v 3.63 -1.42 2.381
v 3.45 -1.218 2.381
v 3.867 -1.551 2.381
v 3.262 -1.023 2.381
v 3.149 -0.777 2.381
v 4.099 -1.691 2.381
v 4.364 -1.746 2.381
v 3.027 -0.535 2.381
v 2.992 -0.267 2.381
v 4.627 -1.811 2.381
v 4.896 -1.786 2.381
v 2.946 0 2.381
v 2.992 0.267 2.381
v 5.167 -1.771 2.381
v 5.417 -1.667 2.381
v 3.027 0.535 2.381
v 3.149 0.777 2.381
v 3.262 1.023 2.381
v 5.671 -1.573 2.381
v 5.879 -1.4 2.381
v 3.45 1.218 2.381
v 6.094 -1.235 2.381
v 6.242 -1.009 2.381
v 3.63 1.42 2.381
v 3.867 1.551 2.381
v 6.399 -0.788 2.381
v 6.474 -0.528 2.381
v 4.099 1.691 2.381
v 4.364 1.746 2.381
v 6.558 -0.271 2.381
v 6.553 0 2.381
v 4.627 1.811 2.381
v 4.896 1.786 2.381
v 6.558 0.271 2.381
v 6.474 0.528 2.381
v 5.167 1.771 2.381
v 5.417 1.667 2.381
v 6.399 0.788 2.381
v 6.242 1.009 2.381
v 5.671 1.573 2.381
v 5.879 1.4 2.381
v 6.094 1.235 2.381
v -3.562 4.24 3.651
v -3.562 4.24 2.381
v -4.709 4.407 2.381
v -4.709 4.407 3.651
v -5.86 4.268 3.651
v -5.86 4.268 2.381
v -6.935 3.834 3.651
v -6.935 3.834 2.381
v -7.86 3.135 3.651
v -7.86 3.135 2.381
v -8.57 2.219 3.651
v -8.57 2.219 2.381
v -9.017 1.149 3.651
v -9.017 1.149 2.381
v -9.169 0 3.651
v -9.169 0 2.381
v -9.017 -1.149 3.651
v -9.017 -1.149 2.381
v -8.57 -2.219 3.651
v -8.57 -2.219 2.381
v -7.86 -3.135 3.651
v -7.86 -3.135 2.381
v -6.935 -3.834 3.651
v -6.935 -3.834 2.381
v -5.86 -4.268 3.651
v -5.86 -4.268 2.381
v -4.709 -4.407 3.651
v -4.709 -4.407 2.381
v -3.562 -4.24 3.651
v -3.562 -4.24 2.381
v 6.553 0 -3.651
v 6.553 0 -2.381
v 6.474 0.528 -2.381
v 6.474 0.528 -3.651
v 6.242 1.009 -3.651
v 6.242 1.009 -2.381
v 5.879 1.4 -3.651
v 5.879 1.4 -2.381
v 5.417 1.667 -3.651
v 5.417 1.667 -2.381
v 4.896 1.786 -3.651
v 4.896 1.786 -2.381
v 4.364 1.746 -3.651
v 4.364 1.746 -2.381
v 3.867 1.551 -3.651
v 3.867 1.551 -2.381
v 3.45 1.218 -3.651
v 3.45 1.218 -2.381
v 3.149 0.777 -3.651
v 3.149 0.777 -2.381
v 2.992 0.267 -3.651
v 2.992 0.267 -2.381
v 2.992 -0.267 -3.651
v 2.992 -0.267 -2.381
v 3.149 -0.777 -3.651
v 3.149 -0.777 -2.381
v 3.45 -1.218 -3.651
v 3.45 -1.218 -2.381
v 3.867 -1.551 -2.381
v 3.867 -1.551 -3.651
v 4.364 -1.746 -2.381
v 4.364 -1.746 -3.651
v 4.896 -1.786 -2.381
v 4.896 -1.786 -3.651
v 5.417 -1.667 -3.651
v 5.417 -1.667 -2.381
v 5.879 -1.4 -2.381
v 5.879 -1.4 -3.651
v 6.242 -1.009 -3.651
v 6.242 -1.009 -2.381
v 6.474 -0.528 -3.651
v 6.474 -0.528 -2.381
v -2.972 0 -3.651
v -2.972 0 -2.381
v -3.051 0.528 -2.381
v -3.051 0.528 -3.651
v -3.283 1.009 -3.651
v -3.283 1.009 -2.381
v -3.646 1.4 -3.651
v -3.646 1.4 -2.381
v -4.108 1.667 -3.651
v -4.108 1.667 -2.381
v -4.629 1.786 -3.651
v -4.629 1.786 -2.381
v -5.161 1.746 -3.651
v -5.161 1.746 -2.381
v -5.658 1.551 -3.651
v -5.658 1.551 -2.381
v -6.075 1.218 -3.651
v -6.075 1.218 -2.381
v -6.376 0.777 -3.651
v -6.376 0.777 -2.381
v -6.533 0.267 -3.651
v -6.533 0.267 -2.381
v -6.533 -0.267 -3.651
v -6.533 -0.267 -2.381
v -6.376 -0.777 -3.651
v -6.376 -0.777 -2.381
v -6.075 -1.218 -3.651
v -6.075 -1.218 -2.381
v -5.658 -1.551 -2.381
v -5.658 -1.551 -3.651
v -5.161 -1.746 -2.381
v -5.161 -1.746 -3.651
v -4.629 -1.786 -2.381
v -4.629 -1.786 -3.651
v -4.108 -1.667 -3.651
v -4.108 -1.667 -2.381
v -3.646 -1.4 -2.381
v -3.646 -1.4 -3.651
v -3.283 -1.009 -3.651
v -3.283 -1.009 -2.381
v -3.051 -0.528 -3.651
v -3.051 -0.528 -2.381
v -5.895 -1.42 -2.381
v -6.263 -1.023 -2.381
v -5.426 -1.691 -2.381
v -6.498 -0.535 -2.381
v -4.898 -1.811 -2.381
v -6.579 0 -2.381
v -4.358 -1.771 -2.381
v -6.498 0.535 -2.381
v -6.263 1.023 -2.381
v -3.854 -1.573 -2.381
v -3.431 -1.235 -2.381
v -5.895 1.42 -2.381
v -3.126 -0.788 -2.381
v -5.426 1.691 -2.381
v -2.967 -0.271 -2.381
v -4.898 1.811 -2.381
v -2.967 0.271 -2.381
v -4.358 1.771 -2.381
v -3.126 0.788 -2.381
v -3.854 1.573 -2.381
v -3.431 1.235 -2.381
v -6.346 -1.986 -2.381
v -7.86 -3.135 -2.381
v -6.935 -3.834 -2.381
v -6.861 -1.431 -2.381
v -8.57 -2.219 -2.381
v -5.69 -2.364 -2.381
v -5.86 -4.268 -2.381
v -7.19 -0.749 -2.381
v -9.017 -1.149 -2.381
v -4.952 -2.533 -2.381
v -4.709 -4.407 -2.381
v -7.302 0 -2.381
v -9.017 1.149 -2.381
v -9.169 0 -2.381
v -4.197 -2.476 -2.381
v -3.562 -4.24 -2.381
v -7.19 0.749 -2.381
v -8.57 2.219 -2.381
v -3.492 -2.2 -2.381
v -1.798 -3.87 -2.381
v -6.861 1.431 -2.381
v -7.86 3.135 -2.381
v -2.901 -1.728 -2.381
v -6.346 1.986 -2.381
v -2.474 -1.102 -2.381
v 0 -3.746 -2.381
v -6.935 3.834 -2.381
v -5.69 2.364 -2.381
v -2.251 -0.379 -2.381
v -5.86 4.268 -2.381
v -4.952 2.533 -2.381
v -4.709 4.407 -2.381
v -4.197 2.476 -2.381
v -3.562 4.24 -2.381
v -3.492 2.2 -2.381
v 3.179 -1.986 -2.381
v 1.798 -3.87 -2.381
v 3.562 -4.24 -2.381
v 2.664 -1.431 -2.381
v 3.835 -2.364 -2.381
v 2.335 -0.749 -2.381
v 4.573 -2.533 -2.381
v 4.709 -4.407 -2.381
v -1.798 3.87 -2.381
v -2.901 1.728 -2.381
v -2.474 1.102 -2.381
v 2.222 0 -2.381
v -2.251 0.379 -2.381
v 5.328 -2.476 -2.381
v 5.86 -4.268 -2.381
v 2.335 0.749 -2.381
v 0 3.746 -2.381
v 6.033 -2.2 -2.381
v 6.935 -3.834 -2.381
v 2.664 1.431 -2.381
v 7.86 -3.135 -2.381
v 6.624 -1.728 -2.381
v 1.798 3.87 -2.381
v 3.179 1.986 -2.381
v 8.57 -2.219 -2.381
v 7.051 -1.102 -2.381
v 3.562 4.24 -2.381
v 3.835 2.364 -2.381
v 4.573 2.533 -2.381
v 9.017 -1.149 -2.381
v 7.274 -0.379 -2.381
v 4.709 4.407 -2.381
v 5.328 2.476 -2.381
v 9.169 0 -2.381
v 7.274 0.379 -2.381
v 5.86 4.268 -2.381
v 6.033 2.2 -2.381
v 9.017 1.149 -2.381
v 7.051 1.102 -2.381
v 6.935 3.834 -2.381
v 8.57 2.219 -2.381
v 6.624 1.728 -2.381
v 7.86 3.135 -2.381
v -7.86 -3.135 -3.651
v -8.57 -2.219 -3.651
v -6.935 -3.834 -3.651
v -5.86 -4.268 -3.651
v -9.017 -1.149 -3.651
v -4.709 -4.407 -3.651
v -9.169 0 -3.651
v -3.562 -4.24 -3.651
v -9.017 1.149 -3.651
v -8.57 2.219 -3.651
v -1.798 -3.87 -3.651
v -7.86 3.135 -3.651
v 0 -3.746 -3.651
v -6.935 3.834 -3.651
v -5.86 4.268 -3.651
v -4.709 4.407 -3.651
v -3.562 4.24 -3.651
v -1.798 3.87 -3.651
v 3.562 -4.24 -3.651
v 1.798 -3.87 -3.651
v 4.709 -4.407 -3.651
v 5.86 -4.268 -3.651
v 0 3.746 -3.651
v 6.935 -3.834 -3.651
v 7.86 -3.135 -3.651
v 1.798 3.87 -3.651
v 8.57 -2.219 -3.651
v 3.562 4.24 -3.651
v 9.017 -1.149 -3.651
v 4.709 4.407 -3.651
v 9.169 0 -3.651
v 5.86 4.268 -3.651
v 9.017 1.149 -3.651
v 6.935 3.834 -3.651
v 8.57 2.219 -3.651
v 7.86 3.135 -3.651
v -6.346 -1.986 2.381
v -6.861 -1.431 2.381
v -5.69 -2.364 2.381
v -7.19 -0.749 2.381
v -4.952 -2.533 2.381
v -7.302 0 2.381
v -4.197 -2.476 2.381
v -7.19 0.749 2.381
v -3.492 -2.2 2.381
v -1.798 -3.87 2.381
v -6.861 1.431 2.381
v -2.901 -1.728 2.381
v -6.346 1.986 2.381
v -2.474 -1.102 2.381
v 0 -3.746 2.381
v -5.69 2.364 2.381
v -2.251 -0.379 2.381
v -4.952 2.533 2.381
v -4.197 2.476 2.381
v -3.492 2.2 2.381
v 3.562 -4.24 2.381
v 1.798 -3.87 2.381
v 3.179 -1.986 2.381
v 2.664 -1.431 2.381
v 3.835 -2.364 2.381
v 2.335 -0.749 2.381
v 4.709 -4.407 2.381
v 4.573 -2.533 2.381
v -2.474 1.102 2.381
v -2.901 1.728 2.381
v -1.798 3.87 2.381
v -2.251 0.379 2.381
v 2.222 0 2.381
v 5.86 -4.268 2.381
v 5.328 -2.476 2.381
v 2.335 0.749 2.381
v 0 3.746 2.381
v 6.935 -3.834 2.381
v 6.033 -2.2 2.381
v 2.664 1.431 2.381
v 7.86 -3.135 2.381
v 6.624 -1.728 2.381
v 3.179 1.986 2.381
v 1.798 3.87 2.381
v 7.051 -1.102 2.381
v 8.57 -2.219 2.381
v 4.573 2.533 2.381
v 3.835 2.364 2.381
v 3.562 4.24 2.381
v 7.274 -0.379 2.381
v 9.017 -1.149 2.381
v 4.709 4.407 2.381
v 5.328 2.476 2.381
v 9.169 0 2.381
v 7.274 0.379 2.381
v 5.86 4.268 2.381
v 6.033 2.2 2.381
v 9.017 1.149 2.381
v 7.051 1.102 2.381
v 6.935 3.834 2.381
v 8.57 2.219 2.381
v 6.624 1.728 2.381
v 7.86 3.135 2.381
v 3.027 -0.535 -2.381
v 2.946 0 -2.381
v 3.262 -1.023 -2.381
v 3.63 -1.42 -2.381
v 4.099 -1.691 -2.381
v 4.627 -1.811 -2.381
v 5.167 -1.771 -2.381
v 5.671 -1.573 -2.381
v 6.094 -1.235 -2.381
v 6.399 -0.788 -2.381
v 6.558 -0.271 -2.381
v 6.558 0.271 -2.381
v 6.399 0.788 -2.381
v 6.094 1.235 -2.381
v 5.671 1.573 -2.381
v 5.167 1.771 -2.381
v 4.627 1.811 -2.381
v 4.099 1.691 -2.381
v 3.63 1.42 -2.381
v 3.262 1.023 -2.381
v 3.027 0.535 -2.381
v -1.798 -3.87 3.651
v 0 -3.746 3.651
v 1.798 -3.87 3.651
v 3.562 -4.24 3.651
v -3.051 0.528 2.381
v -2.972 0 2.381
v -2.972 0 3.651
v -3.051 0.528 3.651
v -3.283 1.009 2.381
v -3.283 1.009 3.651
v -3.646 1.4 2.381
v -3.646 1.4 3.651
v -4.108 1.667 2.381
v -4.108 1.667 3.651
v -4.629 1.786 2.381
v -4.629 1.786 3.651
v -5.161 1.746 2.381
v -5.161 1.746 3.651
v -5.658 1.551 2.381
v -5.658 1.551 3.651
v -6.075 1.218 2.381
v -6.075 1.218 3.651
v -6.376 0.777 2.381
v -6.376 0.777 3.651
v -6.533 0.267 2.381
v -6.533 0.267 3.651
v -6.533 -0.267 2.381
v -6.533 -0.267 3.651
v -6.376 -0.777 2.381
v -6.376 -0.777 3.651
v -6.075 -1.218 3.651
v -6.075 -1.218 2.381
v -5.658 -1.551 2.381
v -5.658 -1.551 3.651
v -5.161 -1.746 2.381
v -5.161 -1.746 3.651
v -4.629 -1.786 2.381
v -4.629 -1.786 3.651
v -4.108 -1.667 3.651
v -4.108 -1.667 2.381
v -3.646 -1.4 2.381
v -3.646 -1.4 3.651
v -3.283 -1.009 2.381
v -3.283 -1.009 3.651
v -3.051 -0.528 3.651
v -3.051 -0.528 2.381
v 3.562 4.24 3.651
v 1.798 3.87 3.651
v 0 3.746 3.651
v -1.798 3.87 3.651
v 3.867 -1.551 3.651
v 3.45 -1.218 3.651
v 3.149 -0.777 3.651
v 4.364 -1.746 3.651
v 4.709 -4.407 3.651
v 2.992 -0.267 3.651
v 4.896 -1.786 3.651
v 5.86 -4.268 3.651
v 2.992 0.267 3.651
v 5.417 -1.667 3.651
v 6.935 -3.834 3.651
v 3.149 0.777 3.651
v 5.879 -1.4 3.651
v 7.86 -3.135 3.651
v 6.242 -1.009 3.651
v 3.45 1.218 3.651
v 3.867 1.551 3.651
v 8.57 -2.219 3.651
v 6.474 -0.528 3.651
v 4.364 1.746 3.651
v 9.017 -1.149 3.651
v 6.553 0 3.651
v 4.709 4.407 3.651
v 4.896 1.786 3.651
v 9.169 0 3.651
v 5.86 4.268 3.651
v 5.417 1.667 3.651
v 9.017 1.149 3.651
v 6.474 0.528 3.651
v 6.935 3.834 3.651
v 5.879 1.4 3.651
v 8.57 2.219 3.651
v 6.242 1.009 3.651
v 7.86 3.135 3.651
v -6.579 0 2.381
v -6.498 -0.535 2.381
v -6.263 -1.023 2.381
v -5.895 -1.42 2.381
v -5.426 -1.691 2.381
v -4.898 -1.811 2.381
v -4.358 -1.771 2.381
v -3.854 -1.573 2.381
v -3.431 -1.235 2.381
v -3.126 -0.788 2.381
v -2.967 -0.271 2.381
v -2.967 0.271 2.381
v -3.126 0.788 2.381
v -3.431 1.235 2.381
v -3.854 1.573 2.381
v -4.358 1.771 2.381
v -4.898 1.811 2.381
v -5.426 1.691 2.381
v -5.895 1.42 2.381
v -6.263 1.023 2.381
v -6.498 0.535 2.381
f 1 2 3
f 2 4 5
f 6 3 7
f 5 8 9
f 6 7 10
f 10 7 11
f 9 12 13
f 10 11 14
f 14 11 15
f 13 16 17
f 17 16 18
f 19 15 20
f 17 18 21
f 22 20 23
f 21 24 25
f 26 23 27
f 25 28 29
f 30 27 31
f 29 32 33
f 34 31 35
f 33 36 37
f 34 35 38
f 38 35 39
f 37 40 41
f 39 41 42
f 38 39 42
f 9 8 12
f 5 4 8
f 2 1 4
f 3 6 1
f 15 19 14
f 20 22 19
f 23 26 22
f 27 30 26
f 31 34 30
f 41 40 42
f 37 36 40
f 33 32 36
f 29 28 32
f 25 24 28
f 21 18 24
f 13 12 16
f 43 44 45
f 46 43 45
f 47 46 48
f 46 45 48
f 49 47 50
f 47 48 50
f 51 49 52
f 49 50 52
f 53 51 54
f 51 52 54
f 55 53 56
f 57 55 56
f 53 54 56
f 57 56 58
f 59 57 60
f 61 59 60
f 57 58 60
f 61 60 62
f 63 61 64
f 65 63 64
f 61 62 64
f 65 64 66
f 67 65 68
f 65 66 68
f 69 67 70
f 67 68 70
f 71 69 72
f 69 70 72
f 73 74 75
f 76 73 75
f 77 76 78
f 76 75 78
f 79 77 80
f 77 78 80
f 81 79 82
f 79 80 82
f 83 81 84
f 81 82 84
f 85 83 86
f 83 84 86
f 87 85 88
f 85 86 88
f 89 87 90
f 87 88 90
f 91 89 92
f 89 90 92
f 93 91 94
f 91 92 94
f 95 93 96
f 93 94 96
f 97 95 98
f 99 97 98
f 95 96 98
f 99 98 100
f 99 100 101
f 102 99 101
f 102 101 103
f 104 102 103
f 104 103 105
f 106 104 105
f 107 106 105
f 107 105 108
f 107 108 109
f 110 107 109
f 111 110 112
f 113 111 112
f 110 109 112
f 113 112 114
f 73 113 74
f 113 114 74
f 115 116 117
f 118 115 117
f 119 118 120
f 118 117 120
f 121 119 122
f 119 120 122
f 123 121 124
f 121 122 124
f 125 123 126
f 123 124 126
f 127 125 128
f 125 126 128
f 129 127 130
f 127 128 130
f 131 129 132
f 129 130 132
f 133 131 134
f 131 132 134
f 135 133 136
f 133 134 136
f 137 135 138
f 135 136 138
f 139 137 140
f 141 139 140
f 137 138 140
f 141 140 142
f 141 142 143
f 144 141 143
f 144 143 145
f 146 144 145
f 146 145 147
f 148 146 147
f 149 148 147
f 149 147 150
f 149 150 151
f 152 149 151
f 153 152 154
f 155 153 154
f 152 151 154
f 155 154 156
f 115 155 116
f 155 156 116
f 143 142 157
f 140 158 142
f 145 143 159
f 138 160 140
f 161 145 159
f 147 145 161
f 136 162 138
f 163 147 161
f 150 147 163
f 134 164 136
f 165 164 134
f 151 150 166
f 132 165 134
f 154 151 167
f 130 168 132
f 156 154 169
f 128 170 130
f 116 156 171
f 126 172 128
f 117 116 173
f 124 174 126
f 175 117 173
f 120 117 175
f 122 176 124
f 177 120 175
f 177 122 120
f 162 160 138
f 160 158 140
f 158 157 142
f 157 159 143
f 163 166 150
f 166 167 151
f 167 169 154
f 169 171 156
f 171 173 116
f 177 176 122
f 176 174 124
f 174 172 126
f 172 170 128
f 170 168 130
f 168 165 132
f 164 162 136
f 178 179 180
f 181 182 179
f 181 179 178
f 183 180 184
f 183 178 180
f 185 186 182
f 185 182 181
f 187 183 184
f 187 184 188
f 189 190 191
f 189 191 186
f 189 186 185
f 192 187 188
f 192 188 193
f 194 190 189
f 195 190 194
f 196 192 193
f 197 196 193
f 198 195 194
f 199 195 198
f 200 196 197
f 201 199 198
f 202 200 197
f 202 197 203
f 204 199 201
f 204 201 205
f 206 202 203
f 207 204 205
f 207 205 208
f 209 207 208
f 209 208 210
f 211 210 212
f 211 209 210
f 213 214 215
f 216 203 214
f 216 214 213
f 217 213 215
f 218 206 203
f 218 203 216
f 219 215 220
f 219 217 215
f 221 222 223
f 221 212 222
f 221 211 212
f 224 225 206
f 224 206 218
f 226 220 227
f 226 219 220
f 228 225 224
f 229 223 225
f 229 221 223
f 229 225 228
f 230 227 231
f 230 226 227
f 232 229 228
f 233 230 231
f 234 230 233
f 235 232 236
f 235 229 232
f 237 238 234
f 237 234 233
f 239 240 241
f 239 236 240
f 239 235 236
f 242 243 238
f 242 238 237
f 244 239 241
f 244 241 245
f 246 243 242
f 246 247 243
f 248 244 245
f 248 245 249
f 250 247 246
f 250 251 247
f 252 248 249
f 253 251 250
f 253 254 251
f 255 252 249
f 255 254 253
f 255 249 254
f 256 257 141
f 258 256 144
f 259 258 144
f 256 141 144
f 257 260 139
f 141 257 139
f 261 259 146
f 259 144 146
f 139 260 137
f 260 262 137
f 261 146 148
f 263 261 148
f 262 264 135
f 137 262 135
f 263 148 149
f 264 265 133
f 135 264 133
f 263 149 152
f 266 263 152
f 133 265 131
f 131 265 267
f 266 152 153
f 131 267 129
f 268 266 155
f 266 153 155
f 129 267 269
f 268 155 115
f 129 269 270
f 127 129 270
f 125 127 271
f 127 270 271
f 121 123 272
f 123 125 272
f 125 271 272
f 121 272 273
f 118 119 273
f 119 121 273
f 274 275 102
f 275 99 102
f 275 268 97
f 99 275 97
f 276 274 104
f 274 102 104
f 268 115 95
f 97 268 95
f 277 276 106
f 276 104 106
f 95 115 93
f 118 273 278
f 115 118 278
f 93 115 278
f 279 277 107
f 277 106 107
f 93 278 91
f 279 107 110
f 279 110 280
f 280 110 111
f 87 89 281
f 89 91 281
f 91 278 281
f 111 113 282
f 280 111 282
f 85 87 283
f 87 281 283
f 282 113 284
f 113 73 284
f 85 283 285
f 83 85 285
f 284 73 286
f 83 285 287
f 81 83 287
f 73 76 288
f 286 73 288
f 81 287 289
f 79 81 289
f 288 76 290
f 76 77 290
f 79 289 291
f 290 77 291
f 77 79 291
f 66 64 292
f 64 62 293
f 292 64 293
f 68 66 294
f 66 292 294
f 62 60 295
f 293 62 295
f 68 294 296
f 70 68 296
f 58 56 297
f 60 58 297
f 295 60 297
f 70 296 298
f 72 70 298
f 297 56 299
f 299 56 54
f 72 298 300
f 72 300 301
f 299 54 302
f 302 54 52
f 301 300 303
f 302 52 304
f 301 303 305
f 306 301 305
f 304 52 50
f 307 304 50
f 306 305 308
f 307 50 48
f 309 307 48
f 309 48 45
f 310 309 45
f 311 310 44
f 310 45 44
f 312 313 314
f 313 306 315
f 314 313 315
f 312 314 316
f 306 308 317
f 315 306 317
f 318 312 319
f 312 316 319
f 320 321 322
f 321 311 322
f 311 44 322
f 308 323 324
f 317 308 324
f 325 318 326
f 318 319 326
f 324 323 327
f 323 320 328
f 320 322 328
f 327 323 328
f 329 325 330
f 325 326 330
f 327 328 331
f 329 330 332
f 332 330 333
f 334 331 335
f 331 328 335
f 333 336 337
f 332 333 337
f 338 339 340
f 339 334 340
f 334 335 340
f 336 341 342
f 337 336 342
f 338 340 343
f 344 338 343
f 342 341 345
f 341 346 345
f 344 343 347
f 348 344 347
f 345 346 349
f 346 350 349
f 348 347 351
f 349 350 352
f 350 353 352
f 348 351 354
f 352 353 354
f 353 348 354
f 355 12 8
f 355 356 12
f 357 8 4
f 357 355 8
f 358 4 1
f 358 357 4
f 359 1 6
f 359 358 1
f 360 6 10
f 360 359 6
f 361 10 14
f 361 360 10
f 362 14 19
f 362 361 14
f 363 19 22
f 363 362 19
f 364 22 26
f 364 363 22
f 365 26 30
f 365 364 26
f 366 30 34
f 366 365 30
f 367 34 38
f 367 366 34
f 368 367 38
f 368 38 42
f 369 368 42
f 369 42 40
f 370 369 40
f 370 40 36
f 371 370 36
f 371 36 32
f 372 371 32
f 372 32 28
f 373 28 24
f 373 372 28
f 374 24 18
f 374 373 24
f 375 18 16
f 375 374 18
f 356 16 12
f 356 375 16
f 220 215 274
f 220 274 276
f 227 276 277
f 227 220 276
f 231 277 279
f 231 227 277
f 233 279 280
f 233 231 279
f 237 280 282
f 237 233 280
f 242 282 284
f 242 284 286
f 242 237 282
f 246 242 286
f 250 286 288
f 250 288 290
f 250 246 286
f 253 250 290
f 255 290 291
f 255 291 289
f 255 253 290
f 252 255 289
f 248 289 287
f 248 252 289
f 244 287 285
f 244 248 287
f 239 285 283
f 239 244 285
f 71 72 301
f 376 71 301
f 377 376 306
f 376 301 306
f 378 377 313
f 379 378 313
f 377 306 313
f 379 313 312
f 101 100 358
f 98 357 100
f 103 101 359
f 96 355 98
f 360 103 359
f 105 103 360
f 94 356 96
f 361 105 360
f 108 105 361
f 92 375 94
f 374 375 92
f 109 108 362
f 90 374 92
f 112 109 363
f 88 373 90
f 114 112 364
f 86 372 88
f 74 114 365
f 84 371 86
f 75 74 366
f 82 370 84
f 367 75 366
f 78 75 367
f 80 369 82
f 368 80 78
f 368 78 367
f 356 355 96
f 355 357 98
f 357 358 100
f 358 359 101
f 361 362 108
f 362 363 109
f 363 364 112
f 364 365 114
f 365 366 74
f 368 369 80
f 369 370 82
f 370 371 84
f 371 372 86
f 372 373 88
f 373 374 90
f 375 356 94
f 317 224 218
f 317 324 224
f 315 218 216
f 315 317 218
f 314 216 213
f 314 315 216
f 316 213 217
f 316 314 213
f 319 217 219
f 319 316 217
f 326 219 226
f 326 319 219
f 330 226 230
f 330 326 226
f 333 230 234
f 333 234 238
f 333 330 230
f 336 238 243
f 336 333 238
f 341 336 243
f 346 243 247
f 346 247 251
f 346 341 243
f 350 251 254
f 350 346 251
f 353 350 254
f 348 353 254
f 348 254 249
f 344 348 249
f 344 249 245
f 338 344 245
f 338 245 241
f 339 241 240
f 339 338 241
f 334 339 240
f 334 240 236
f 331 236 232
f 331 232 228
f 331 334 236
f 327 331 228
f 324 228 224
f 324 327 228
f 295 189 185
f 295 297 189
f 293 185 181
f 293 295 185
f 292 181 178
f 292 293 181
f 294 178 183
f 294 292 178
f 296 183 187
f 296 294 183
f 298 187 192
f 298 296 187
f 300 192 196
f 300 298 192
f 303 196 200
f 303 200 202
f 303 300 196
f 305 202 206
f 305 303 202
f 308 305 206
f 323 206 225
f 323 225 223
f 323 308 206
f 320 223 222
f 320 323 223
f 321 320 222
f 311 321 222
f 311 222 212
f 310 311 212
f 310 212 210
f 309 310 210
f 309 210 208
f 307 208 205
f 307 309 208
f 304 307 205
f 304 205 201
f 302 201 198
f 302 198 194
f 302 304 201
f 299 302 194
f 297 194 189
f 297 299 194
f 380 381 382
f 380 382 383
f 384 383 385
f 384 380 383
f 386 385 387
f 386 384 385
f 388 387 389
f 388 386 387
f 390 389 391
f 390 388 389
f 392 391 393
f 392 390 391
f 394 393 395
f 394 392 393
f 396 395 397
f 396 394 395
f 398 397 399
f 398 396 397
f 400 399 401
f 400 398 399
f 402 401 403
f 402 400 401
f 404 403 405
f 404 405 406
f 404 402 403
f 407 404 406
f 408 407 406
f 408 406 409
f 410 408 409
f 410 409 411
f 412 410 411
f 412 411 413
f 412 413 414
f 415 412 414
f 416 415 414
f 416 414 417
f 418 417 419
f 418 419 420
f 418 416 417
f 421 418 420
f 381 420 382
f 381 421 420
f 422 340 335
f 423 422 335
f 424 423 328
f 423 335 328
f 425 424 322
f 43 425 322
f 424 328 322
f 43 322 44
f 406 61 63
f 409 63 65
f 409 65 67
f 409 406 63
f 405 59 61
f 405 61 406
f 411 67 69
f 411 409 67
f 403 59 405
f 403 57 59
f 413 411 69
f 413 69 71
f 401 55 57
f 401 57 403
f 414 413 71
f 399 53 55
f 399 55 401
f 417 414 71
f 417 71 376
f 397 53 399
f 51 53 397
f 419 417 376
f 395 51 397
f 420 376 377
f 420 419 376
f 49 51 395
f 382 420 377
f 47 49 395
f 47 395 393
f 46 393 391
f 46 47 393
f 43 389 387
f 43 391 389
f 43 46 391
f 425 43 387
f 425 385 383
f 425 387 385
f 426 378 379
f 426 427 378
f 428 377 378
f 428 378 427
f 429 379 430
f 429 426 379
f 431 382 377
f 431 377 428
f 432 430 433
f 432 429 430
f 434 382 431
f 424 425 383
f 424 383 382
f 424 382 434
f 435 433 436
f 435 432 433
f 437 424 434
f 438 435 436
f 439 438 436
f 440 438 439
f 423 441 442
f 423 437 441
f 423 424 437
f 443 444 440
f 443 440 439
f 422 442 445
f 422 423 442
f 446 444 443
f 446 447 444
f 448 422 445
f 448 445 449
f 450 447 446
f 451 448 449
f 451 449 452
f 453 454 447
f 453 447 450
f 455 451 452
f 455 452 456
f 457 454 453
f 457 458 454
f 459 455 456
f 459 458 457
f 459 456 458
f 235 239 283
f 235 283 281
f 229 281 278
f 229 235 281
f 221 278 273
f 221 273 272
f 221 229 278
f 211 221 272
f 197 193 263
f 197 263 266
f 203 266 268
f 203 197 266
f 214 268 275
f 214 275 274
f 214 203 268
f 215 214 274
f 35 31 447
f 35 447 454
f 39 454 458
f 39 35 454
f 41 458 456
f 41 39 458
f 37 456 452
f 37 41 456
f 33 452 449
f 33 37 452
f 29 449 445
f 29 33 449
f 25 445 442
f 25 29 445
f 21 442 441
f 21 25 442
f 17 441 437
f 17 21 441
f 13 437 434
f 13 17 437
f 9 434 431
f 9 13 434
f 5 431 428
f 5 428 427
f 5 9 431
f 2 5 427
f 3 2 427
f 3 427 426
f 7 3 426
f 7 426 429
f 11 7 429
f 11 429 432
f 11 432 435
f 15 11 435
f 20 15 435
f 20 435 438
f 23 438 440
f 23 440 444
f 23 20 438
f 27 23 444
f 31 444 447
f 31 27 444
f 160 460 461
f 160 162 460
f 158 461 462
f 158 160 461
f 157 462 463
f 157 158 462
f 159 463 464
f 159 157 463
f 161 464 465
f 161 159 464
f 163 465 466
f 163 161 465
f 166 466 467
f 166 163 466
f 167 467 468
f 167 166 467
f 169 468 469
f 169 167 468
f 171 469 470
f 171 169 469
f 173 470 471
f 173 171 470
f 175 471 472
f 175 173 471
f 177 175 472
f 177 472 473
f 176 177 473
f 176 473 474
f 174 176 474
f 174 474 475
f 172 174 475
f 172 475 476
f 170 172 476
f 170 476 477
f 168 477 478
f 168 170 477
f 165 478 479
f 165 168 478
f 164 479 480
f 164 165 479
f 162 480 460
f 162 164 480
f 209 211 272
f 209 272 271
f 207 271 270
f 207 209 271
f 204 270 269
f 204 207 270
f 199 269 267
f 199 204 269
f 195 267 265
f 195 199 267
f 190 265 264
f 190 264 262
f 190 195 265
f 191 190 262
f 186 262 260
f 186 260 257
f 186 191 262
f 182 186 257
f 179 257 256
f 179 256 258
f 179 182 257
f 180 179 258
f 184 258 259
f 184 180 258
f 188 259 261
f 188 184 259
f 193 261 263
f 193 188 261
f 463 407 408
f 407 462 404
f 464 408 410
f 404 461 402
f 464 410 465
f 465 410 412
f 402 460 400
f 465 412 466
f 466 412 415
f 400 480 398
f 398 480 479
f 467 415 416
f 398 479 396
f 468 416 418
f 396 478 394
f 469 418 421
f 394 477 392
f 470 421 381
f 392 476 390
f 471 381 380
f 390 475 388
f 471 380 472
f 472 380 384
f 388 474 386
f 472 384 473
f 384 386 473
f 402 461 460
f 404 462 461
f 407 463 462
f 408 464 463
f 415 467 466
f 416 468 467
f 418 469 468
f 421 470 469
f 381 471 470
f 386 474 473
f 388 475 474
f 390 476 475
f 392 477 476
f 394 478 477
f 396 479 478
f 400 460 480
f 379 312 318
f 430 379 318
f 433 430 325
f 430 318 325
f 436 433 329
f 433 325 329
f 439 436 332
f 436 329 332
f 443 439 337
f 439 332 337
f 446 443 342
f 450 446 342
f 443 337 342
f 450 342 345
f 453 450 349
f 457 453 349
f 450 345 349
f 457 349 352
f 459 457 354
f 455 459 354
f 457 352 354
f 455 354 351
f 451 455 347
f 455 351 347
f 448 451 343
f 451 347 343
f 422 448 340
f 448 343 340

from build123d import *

# Parameters (mm, degrees)
SKETCH4_R             = 2.54
SKETCH4_R_2           = 1.8161
BOSS_EXTRUDE1_DEPTH   = 2.38125
BOSS_EXTRUDE1_2_DEPTH = 2.38125
SKETCH5_R             = 1.7907
BOSS_EXTRUDE2_DEPTH   = 1.27


with BuildPart() as part:
    # Sketch4 → Boss-Extrude1 (new, symmetric)
    with BuildSketch(Plane.XY):
        with Locations(Location((-4.7625, 0, 0), (0, 0, 180))):
            Circle(SKETCH4_R)
        with Locations(Location((-4.7625, 0, 0), (0, 0, 180))):
            Circle(SKETCH4_R_2, mode=Mode.SUBTRACT)
    extrude(amount=BOSS_EXTRUDE1_DEPTH, both=True)


with BuildPart() as body_2:
    # Sketch4 → Boss-Extrude1 2 (new, symmetric)
    with BuildSketch(Plane.XY):
        with Locations(Location((4.7625, 0, 0), (0, 0, 180))):
            Circle(SKETCH4_R)
        with Locations(Location((4.7625, 0, 0), (0, 0, 180))):
            Circle(SKETCH4_R_2, mode=Mode.SUBTRACT)
    extrude(amount=BOSS_EXTRUDE1_2_DEPTH, both=True)


with BuildPart() as body_3:
    # Sketch5 → Boss-Extrude2 (new body)
    with BuildSketch(Plane.XY.offset(2.38125)):
        with BuildLine():
            ThreePointArc((-3.562267566, 4.240307738), (-9.1694, 0), (-3.562267566, -4.240307738))
            ThreePointArc((-3.562267566, -4.240307738), (0, -3.745865), (3.562267566, -4.240307738))
            ThreePointArc((3.562267566, -4.240307738), (9.1694, 0), (3.562267566, 4.240307738))
            ThreePointArc((3.562267566, 4.240307738), (0, 3.745865), (-3.562267566, 4.240307738))
        make_face()
        with Locations((-4.7625, 0)):
            Circle(SKETCH5_R, mode=Mode.SUBTRACT)
        with Locations((4.7625, 0)):
            Circle(SKETCH5_R, mode=Mode.SUBTRACT)
    extrude(amount=BOSS_EXTRUDE2_DEPTH)


with BuildPart() as body_4:
    # Mirror3: mirrored copy
    add(body_3.part.mirror(Plane.XY))

    # Combine2: union body 3, body 2, part
    add(body_3.part)
    add(body_2.part)
    add(part.part)


solid = body_4.part
